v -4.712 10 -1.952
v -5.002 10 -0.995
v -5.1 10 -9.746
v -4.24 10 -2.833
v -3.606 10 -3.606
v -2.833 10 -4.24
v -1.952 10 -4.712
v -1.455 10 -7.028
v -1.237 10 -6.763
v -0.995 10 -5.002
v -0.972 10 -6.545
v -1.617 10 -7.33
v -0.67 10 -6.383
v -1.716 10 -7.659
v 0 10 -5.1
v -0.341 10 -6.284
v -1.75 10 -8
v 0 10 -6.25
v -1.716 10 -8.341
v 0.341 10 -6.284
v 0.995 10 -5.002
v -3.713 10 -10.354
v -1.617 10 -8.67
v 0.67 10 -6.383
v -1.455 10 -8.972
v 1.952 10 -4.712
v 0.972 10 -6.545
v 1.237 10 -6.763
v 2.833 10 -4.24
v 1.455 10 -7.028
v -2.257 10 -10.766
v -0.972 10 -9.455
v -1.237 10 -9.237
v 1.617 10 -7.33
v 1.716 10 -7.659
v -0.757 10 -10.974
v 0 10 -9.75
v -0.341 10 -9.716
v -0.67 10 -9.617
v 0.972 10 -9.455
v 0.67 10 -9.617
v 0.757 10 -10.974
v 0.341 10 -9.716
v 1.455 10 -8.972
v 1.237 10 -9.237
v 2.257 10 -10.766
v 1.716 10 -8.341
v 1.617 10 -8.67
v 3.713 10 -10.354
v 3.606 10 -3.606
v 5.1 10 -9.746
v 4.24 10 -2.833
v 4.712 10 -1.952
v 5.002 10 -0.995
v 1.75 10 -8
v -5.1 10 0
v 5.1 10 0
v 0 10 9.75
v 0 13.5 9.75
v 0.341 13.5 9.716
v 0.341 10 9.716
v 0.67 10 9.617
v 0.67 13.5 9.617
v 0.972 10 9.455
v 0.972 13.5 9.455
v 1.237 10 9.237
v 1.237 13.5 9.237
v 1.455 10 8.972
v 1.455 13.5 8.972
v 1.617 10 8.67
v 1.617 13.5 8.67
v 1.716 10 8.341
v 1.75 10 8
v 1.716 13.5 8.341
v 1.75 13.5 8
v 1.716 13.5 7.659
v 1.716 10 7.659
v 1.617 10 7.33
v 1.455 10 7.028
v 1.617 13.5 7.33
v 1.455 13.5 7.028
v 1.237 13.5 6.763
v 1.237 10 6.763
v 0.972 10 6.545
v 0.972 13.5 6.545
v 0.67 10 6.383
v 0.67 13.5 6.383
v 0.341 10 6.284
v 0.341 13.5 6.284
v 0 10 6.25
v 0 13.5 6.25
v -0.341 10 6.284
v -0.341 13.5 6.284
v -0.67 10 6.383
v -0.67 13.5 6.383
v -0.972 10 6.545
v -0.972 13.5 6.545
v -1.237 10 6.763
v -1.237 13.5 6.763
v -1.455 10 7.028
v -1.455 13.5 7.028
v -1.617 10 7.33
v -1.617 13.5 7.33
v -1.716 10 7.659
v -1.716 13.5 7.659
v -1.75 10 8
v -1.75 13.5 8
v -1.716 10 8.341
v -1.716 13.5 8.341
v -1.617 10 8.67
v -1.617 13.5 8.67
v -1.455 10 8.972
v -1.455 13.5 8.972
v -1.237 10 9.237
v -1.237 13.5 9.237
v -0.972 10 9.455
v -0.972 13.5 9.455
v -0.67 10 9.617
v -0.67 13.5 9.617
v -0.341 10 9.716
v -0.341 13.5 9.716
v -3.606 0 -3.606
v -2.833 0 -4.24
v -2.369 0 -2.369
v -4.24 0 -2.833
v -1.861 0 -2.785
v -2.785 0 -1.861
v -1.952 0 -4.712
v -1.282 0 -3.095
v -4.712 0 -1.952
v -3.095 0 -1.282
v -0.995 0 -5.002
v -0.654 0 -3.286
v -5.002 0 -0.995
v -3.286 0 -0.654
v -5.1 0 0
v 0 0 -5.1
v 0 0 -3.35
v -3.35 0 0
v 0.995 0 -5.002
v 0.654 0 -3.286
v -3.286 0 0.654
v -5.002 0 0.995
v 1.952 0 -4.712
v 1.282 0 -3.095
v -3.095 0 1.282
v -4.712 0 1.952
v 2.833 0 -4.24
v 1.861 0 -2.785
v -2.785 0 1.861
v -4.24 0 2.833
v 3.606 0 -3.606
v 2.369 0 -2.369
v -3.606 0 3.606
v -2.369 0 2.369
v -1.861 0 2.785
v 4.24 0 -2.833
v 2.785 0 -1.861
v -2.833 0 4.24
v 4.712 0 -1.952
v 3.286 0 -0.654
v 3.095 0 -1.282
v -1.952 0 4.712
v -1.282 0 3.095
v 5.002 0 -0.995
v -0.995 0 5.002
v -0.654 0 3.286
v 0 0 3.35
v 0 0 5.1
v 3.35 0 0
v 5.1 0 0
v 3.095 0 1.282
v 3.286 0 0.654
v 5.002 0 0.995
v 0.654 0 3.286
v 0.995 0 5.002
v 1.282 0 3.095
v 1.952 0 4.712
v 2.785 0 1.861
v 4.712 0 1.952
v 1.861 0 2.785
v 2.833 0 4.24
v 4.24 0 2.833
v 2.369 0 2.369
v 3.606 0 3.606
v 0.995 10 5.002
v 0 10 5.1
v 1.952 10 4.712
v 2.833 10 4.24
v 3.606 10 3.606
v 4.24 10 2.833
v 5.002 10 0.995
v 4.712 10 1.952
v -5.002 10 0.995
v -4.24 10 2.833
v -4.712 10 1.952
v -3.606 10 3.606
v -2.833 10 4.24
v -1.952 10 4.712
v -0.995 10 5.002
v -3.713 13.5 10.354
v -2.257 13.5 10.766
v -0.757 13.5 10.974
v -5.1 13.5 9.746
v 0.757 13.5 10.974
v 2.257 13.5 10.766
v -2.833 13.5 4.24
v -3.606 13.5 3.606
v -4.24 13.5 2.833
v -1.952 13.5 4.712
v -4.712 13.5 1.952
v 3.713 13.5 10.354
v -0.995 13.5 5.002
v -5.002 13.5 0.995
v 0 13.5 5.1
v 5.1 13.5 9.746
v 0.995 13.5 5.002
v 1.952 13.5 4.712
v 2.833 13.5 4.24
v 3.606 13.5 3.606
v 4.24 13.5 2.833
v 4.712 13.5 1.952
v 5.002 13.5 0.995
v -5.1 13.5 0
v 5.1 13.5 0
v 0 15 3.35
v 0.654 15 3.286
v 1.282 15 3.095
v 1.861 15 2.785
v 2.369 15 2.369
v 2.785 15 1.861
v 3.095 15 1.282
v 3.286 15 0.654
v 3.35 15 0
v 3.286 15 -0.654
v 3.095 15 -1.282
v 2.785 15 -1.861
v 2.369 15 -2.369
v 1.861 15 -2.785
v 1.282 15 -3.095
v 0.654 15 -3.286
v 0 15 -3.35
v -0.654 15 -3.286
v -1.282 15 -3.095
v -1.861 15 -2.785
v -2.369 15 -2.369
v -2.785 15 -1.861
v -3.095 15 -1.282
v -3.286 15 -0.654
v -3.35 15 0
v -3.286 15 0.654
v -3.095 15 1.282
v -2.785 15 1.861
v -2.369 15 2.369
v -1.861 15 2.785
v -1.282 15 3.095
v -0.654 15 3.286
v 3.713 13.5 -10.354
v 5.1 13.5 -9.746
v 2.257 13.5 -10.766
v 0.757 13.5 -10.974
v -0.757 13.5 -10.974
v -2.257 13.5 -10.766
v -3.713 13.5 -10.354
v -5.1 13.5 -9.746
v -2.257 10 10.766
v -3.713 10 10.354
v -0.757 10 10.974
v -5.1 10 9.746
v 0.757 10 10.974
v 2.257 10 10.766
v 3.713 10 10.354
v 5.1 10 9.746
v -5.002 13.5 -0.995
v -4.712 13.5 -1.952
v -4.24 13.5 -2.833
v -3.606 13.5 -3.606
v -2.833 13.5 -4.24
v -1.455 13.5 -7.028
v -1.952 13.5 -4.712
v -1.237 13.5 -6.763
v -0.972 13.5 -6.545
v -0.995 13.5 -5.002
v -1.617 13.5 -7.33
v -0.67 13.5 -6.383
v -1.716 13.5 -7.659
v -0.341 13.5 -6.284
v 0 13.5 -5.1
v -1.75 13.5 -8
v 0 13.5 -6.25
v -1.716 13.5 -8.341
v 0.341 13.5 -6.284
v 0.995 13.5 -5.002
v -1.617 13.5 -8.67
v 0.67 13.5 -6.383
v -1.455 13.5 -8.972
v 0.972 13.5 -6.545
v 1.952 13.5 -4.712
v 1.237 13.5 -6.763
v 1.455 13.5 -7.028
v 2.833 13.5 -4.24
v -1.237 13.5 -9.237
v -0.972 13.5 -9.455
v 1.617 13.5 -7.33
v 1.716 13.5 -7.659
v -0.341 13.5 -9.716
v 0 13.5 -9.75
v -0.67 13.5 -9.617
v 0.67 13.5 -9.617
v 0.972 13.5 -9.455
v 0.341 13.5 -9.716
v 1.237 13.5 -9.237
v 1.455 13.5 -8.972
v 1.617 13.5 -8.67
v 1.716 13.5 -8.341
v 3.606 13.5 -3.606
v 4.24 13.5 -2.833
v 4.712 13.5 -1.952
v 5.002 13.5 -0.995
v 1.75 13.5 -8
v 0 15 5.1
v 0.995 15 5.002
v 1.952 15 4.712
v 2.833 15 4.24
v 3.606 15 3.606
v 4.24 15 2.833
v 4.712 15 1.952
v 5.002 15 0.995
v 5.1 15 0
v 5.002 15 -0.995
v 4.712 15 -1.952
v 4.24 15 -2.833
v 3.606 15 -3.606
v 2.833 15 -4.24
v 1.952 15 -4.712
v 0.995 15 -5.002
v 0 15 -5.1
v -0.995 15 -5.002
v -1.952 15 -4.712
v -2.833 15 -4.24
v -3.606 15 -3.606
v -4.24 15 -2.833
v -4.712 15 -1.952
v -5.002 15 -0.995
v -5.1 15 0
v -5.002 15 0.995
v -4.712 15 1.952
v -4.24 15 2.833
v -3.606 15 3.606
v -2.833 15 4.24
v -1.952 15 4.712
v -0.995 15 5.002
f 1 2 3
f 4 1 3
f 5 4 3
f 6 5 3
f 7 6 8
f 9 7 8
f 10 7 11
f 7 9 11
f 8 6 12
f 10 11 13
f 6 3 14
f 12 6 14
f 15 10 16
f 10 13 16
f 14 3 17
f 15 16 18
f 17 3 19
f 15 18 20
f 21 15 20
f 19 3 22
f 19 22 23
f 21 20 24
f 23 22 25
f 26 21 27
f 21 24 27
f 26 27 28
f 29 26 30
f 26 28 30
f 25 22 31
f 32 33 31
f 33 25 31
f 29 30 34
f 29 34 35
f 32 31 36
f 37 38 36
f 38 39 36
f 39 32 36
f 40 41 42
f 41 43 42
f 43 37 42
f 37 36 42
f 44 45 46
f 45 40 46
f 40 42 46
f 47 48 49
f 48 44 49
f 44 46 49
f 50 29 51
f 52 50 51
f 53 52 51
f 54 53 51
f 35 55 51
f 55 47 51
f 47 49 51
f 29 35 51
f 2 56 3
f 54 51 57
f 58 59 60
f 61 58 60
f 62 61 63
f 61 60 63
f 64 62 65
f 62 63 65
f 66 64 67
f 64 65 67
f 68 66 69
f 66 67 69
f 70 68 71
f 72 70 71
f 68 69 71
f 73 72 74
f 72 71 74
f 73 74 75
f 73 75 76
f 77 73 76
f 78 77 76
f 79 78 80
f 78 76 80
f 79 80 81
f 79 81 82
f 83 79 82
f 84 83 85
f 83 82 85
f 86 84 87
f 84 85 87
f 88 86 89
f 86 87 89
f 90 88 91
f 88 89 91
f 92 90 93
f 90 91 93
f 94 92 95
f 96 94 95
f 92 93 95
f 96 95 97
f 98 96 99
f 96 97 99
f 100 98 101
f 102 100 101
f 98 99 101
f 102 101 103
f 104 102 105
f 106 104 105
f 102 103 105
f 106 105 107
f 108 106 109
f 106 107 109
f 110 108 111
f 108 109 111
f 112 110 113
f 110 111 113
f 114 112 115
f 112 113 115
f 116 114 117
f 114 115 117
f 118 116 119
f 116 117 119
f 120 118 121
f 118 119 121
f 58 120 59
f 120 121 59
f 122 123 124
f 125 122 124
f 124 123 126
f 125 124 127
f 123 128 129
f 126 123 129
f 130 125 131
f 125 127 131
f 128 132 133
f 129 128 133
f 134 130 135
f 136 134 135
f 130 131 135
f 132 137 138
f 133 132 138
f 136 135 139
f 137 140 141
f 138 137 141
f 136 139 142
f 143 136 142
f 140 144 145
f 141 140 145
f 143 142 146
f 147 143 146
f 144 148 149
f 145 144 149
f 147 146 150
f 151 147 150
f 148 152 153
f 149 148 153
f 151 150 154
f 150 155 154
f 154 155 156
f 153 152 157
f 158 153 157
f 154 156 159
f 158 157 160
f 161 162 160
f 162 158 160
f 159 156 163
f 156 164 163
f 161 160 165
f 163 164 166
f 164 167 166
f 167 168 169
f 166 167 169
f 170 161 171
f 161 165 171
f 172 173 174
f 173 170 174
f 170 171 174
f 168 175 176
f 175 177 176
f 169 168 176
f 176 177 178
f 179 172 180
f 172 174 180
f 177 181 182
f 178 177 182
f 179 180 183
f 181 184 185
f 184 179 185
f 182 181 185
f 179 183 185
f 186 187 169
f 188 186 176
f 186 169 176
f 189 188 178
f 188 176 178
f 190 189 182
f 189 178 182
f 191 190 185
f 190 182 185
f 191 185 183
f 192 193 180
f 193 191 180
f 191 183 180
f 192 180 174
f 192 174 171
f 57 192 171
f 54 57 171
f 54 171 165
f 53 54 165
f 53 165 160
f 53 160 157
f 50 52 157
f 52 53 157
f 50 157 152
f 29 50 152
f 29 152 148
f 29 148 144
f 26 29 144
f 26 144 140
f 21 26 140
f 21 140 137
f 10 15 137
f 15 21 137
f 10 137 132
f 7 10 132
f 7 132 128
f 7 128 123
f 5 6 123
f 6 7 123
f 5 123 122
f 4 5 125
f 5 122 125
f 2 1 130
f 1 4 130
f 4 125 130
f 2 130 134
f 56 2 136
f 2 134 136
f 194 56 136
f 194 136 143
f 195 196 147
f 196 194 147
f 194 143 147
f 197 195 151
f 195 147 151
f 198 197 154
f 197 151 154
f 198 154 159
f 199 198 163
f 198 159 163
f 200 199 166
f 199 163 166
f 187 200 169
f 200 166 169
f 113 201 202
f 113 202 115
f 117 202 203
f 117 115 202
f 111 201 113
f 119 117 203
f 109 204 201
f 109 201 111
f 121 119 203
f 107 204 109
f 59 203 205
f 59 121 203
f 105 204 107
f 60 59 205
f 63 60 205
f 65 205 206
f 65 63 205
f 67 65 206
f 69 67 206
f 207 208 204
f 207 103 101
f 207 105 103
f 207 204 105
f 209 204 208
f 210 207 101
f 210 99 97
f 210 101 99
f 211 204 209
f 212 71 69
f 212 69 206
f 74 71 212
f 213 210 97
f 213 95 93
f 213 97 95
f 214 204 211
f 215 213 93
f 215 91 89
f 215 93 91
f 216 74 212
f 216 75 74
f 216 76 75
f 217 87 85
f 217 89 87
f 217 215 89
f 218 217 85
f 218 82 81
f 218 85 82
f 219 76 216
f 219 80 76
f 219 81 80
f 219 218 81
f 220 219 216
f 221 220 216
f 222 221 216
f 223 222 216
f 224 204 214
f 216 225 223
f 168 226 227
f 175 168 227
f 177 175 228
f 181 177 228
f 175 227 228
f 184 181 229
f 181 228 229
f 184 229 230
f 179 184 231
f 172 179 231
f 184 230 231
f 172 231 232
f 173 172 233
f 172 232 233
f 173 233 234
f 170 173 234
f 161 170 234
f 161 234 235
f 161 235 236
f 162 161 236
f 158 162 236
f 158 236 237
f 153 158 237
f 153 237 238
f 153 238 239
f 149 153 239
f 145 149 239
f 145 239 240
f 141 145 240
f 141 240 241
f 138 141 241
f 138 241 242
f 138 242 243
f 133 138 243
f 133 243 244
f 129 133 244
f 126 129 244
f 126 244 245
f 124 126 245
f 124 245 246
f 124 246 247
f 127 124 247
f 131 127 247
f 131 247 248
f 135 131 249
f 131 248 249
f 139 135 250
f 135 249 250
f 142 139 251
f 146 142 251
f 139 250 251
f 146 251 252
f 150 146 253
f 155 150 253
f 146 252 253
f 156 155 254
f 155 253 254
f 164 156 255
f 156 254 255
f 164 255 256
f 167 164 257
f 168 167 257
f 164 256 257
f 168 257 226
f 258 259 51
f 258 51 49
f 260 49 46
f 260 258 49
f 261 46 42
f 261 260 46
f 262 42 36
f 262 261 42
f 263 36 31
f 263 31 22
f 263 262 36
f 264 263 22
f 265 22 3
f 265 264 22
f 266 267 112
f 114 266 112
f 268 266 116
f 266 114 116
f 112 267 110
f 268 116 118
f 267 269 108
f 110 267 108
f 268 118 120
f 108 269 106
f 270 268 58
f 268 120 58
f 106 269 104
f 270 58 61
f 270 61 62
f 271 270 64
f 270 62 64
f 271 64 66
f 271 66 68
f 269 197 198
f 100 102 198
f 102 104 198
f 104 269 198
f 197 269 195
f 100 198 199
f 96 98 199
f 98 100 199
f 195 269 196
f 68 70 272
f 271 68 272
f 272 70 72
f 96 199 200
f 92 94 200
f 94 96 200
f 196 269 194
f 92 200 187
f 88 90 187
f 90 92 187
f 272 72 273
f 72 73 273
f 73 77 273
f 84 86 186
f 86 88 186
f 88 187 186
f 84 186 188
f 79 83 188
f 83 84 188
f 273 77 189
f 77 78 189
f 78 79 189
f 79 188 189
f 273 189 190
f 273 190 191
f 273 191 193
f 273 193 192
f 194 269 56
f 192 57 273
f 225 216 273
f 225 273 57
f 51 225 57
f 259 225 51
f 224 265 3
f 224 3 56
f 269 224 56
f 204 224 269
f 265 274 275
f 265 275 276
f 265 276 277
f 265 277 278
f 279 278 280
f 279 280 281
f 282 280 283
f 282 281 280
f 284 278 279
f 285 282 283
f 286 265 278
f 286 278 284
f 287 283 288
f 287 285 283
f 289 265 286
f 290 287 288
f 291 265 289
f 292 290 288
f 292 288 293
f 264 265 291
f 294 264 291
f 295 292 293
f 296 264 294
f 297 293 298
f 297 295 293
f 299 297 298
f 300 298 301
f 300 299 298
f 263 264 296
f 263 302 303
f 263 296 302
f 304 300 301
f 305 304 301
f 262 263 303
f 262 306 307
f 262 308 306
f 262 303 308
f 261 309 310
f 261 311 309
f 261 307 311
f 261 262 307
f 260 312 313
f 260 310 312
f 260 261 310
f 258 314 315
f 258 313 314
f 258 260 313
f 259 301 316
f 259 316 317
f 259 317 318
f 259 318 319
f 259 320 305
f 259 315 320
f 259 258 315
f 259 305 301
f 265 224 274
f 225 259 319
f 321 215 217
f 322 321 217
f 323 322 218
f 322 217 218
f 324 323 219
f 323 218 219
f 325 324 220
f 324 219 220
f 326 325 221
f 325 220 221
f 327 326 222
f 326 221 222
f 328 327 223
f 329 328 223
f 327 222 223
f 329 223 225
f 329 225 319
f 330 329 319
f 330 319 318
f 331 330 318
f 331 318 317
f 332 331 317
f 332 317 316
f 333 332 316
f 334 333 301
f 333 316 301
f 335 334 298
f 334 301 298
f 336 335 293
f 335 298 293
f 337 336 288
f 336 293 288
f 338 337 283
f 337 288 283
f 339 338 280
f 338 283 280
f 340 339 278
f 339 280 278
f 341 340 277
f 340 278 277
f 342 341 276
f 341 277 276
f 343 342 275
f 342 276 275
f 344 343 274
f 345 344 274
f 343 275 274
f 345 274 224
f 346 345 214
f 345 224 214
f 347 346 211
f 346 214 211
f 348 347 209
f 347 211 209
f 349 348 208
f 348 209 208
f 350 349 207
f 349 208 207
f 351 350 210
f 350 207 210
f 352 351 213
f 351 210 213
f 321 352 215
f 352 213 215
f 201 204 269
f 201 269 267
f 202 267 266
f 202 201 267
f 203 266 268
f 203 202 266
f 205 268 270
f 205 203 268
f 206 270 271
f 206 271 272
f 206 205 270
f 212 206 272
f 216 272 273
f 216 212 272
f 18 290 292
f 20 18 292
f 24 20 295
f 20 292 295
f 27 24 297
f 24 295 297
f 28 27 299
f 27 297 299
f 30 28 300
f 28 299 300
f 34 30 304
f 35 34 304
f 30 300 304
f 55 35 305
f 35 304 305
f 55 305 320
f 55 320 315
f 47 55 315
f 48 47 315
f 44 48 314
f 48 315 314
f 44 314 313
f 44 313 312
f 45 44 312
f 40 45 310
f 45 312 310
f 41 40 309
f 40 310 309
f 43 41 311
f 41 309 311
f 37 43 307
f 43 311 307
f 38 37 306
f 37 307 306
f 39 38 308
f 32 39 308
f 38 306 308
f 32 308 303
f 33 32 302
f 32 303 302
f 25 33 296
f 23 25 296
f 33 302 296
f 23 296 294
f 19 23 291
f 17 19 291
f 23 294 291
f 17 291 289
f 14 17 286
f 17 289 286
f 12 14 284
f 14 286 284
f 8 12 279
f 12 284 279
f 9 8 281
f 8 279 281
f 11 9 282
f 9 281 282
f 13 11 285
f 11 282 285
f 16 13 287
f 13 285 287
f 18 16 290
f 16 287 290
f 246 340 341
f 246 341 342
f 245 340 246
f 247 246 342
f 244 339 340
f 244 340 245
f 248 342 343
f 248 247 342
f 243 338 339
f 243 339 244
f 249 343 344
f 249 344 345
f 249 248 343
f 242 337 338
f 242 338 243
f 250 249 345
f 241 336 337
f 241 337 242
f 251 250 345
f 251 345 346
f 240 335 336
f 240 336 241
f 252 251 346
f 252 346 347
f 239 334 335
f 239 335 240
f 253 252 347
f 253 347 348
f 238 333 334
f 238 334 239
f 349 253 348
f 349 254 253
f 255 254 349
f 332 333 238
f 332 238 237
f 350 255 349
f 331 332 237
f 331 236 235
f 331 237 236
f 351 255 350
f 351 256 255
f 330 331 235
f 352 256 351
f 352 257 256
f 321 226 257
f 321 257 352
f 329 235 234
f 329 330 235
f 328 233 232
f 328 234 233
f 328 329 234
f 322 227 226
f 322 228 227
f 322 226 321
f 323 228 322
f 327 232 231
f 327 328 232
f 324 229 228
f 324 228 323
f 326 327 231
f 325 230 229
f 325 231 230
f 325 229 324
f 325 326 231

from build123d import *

# Parameters (mm, degrees)
SKETCH1_R           = 5.1
BOSS_EXTRUDE1_DEPTH = 15
SKETCH2_R           = 1.75
BOSS_EXTRUDE2_DEPTH = 3.5
SKETCH3_R           = 3.35
CUT_EXTRUDE1_DEPTH  = 20.287560758


with BuildPart() as part:
    # Sketch1 → Boss-Extrude1 (new body)
    with BuildSketch(Plane(origin=(0, 0, 0), x_dir=(1, 0, 0), z_dir=(0, 1, 0))):
        with Locations(Location((0, 0, 0), (0, 0, 270))):
            Circle(SKETCH1_R)
    extrude(amount=BOSS_EXTRUDE1_DEPTH)

    # Sketch2 → Boss-Extrude2 (add)
    with BuildSketch(Plane(origin=(0, 13.5, 0), x_dir=(1, 0, 0), z_dir=(0, 1, 0))):
        with BuildLine():
            Line((-5.1, 9.746281342), (-5.1, -9.746281342))
            ThreePointArc((-5.1, -9.746281342), (0, -11), (5.1, -9.746281342))
            Line((5.1, -9.746281342), (5.1, 9.746281342))
            ThreePointArc((5.1, 9.746281342), (0, 11), (-5.1, 9.746281342))
        make_face()
        with Locations(Location((0, 8, 0), (0, 0, 270))):
            Circle(SKETCH2_R, mode=Mode.SUBTRACT)
        with Locations(Location((0, -8, 0), (0, 0, 270))):
            Circle(SKETCH2_R, mode=Mode.SUBTRACT)
    extrude(amount=-BOSS_EXTRUDE2_DEPTH)

    # Sketch3 → Cut-Extrude1 (cut, through all)
    with BuildSketch(Plane(origin=(0, 15, 0), x_dir=(1, 0, 0), z_dir=(0, 1, 0))):
        with Locations(Location((0, 0, 0), (0, 0, 270))):
            Circle(SKETCH3_R)
    extrude(amount=-CUT_EXTRUDE1_DEPTH, mode=Mode.SUBTRACT)


solid = part.part
